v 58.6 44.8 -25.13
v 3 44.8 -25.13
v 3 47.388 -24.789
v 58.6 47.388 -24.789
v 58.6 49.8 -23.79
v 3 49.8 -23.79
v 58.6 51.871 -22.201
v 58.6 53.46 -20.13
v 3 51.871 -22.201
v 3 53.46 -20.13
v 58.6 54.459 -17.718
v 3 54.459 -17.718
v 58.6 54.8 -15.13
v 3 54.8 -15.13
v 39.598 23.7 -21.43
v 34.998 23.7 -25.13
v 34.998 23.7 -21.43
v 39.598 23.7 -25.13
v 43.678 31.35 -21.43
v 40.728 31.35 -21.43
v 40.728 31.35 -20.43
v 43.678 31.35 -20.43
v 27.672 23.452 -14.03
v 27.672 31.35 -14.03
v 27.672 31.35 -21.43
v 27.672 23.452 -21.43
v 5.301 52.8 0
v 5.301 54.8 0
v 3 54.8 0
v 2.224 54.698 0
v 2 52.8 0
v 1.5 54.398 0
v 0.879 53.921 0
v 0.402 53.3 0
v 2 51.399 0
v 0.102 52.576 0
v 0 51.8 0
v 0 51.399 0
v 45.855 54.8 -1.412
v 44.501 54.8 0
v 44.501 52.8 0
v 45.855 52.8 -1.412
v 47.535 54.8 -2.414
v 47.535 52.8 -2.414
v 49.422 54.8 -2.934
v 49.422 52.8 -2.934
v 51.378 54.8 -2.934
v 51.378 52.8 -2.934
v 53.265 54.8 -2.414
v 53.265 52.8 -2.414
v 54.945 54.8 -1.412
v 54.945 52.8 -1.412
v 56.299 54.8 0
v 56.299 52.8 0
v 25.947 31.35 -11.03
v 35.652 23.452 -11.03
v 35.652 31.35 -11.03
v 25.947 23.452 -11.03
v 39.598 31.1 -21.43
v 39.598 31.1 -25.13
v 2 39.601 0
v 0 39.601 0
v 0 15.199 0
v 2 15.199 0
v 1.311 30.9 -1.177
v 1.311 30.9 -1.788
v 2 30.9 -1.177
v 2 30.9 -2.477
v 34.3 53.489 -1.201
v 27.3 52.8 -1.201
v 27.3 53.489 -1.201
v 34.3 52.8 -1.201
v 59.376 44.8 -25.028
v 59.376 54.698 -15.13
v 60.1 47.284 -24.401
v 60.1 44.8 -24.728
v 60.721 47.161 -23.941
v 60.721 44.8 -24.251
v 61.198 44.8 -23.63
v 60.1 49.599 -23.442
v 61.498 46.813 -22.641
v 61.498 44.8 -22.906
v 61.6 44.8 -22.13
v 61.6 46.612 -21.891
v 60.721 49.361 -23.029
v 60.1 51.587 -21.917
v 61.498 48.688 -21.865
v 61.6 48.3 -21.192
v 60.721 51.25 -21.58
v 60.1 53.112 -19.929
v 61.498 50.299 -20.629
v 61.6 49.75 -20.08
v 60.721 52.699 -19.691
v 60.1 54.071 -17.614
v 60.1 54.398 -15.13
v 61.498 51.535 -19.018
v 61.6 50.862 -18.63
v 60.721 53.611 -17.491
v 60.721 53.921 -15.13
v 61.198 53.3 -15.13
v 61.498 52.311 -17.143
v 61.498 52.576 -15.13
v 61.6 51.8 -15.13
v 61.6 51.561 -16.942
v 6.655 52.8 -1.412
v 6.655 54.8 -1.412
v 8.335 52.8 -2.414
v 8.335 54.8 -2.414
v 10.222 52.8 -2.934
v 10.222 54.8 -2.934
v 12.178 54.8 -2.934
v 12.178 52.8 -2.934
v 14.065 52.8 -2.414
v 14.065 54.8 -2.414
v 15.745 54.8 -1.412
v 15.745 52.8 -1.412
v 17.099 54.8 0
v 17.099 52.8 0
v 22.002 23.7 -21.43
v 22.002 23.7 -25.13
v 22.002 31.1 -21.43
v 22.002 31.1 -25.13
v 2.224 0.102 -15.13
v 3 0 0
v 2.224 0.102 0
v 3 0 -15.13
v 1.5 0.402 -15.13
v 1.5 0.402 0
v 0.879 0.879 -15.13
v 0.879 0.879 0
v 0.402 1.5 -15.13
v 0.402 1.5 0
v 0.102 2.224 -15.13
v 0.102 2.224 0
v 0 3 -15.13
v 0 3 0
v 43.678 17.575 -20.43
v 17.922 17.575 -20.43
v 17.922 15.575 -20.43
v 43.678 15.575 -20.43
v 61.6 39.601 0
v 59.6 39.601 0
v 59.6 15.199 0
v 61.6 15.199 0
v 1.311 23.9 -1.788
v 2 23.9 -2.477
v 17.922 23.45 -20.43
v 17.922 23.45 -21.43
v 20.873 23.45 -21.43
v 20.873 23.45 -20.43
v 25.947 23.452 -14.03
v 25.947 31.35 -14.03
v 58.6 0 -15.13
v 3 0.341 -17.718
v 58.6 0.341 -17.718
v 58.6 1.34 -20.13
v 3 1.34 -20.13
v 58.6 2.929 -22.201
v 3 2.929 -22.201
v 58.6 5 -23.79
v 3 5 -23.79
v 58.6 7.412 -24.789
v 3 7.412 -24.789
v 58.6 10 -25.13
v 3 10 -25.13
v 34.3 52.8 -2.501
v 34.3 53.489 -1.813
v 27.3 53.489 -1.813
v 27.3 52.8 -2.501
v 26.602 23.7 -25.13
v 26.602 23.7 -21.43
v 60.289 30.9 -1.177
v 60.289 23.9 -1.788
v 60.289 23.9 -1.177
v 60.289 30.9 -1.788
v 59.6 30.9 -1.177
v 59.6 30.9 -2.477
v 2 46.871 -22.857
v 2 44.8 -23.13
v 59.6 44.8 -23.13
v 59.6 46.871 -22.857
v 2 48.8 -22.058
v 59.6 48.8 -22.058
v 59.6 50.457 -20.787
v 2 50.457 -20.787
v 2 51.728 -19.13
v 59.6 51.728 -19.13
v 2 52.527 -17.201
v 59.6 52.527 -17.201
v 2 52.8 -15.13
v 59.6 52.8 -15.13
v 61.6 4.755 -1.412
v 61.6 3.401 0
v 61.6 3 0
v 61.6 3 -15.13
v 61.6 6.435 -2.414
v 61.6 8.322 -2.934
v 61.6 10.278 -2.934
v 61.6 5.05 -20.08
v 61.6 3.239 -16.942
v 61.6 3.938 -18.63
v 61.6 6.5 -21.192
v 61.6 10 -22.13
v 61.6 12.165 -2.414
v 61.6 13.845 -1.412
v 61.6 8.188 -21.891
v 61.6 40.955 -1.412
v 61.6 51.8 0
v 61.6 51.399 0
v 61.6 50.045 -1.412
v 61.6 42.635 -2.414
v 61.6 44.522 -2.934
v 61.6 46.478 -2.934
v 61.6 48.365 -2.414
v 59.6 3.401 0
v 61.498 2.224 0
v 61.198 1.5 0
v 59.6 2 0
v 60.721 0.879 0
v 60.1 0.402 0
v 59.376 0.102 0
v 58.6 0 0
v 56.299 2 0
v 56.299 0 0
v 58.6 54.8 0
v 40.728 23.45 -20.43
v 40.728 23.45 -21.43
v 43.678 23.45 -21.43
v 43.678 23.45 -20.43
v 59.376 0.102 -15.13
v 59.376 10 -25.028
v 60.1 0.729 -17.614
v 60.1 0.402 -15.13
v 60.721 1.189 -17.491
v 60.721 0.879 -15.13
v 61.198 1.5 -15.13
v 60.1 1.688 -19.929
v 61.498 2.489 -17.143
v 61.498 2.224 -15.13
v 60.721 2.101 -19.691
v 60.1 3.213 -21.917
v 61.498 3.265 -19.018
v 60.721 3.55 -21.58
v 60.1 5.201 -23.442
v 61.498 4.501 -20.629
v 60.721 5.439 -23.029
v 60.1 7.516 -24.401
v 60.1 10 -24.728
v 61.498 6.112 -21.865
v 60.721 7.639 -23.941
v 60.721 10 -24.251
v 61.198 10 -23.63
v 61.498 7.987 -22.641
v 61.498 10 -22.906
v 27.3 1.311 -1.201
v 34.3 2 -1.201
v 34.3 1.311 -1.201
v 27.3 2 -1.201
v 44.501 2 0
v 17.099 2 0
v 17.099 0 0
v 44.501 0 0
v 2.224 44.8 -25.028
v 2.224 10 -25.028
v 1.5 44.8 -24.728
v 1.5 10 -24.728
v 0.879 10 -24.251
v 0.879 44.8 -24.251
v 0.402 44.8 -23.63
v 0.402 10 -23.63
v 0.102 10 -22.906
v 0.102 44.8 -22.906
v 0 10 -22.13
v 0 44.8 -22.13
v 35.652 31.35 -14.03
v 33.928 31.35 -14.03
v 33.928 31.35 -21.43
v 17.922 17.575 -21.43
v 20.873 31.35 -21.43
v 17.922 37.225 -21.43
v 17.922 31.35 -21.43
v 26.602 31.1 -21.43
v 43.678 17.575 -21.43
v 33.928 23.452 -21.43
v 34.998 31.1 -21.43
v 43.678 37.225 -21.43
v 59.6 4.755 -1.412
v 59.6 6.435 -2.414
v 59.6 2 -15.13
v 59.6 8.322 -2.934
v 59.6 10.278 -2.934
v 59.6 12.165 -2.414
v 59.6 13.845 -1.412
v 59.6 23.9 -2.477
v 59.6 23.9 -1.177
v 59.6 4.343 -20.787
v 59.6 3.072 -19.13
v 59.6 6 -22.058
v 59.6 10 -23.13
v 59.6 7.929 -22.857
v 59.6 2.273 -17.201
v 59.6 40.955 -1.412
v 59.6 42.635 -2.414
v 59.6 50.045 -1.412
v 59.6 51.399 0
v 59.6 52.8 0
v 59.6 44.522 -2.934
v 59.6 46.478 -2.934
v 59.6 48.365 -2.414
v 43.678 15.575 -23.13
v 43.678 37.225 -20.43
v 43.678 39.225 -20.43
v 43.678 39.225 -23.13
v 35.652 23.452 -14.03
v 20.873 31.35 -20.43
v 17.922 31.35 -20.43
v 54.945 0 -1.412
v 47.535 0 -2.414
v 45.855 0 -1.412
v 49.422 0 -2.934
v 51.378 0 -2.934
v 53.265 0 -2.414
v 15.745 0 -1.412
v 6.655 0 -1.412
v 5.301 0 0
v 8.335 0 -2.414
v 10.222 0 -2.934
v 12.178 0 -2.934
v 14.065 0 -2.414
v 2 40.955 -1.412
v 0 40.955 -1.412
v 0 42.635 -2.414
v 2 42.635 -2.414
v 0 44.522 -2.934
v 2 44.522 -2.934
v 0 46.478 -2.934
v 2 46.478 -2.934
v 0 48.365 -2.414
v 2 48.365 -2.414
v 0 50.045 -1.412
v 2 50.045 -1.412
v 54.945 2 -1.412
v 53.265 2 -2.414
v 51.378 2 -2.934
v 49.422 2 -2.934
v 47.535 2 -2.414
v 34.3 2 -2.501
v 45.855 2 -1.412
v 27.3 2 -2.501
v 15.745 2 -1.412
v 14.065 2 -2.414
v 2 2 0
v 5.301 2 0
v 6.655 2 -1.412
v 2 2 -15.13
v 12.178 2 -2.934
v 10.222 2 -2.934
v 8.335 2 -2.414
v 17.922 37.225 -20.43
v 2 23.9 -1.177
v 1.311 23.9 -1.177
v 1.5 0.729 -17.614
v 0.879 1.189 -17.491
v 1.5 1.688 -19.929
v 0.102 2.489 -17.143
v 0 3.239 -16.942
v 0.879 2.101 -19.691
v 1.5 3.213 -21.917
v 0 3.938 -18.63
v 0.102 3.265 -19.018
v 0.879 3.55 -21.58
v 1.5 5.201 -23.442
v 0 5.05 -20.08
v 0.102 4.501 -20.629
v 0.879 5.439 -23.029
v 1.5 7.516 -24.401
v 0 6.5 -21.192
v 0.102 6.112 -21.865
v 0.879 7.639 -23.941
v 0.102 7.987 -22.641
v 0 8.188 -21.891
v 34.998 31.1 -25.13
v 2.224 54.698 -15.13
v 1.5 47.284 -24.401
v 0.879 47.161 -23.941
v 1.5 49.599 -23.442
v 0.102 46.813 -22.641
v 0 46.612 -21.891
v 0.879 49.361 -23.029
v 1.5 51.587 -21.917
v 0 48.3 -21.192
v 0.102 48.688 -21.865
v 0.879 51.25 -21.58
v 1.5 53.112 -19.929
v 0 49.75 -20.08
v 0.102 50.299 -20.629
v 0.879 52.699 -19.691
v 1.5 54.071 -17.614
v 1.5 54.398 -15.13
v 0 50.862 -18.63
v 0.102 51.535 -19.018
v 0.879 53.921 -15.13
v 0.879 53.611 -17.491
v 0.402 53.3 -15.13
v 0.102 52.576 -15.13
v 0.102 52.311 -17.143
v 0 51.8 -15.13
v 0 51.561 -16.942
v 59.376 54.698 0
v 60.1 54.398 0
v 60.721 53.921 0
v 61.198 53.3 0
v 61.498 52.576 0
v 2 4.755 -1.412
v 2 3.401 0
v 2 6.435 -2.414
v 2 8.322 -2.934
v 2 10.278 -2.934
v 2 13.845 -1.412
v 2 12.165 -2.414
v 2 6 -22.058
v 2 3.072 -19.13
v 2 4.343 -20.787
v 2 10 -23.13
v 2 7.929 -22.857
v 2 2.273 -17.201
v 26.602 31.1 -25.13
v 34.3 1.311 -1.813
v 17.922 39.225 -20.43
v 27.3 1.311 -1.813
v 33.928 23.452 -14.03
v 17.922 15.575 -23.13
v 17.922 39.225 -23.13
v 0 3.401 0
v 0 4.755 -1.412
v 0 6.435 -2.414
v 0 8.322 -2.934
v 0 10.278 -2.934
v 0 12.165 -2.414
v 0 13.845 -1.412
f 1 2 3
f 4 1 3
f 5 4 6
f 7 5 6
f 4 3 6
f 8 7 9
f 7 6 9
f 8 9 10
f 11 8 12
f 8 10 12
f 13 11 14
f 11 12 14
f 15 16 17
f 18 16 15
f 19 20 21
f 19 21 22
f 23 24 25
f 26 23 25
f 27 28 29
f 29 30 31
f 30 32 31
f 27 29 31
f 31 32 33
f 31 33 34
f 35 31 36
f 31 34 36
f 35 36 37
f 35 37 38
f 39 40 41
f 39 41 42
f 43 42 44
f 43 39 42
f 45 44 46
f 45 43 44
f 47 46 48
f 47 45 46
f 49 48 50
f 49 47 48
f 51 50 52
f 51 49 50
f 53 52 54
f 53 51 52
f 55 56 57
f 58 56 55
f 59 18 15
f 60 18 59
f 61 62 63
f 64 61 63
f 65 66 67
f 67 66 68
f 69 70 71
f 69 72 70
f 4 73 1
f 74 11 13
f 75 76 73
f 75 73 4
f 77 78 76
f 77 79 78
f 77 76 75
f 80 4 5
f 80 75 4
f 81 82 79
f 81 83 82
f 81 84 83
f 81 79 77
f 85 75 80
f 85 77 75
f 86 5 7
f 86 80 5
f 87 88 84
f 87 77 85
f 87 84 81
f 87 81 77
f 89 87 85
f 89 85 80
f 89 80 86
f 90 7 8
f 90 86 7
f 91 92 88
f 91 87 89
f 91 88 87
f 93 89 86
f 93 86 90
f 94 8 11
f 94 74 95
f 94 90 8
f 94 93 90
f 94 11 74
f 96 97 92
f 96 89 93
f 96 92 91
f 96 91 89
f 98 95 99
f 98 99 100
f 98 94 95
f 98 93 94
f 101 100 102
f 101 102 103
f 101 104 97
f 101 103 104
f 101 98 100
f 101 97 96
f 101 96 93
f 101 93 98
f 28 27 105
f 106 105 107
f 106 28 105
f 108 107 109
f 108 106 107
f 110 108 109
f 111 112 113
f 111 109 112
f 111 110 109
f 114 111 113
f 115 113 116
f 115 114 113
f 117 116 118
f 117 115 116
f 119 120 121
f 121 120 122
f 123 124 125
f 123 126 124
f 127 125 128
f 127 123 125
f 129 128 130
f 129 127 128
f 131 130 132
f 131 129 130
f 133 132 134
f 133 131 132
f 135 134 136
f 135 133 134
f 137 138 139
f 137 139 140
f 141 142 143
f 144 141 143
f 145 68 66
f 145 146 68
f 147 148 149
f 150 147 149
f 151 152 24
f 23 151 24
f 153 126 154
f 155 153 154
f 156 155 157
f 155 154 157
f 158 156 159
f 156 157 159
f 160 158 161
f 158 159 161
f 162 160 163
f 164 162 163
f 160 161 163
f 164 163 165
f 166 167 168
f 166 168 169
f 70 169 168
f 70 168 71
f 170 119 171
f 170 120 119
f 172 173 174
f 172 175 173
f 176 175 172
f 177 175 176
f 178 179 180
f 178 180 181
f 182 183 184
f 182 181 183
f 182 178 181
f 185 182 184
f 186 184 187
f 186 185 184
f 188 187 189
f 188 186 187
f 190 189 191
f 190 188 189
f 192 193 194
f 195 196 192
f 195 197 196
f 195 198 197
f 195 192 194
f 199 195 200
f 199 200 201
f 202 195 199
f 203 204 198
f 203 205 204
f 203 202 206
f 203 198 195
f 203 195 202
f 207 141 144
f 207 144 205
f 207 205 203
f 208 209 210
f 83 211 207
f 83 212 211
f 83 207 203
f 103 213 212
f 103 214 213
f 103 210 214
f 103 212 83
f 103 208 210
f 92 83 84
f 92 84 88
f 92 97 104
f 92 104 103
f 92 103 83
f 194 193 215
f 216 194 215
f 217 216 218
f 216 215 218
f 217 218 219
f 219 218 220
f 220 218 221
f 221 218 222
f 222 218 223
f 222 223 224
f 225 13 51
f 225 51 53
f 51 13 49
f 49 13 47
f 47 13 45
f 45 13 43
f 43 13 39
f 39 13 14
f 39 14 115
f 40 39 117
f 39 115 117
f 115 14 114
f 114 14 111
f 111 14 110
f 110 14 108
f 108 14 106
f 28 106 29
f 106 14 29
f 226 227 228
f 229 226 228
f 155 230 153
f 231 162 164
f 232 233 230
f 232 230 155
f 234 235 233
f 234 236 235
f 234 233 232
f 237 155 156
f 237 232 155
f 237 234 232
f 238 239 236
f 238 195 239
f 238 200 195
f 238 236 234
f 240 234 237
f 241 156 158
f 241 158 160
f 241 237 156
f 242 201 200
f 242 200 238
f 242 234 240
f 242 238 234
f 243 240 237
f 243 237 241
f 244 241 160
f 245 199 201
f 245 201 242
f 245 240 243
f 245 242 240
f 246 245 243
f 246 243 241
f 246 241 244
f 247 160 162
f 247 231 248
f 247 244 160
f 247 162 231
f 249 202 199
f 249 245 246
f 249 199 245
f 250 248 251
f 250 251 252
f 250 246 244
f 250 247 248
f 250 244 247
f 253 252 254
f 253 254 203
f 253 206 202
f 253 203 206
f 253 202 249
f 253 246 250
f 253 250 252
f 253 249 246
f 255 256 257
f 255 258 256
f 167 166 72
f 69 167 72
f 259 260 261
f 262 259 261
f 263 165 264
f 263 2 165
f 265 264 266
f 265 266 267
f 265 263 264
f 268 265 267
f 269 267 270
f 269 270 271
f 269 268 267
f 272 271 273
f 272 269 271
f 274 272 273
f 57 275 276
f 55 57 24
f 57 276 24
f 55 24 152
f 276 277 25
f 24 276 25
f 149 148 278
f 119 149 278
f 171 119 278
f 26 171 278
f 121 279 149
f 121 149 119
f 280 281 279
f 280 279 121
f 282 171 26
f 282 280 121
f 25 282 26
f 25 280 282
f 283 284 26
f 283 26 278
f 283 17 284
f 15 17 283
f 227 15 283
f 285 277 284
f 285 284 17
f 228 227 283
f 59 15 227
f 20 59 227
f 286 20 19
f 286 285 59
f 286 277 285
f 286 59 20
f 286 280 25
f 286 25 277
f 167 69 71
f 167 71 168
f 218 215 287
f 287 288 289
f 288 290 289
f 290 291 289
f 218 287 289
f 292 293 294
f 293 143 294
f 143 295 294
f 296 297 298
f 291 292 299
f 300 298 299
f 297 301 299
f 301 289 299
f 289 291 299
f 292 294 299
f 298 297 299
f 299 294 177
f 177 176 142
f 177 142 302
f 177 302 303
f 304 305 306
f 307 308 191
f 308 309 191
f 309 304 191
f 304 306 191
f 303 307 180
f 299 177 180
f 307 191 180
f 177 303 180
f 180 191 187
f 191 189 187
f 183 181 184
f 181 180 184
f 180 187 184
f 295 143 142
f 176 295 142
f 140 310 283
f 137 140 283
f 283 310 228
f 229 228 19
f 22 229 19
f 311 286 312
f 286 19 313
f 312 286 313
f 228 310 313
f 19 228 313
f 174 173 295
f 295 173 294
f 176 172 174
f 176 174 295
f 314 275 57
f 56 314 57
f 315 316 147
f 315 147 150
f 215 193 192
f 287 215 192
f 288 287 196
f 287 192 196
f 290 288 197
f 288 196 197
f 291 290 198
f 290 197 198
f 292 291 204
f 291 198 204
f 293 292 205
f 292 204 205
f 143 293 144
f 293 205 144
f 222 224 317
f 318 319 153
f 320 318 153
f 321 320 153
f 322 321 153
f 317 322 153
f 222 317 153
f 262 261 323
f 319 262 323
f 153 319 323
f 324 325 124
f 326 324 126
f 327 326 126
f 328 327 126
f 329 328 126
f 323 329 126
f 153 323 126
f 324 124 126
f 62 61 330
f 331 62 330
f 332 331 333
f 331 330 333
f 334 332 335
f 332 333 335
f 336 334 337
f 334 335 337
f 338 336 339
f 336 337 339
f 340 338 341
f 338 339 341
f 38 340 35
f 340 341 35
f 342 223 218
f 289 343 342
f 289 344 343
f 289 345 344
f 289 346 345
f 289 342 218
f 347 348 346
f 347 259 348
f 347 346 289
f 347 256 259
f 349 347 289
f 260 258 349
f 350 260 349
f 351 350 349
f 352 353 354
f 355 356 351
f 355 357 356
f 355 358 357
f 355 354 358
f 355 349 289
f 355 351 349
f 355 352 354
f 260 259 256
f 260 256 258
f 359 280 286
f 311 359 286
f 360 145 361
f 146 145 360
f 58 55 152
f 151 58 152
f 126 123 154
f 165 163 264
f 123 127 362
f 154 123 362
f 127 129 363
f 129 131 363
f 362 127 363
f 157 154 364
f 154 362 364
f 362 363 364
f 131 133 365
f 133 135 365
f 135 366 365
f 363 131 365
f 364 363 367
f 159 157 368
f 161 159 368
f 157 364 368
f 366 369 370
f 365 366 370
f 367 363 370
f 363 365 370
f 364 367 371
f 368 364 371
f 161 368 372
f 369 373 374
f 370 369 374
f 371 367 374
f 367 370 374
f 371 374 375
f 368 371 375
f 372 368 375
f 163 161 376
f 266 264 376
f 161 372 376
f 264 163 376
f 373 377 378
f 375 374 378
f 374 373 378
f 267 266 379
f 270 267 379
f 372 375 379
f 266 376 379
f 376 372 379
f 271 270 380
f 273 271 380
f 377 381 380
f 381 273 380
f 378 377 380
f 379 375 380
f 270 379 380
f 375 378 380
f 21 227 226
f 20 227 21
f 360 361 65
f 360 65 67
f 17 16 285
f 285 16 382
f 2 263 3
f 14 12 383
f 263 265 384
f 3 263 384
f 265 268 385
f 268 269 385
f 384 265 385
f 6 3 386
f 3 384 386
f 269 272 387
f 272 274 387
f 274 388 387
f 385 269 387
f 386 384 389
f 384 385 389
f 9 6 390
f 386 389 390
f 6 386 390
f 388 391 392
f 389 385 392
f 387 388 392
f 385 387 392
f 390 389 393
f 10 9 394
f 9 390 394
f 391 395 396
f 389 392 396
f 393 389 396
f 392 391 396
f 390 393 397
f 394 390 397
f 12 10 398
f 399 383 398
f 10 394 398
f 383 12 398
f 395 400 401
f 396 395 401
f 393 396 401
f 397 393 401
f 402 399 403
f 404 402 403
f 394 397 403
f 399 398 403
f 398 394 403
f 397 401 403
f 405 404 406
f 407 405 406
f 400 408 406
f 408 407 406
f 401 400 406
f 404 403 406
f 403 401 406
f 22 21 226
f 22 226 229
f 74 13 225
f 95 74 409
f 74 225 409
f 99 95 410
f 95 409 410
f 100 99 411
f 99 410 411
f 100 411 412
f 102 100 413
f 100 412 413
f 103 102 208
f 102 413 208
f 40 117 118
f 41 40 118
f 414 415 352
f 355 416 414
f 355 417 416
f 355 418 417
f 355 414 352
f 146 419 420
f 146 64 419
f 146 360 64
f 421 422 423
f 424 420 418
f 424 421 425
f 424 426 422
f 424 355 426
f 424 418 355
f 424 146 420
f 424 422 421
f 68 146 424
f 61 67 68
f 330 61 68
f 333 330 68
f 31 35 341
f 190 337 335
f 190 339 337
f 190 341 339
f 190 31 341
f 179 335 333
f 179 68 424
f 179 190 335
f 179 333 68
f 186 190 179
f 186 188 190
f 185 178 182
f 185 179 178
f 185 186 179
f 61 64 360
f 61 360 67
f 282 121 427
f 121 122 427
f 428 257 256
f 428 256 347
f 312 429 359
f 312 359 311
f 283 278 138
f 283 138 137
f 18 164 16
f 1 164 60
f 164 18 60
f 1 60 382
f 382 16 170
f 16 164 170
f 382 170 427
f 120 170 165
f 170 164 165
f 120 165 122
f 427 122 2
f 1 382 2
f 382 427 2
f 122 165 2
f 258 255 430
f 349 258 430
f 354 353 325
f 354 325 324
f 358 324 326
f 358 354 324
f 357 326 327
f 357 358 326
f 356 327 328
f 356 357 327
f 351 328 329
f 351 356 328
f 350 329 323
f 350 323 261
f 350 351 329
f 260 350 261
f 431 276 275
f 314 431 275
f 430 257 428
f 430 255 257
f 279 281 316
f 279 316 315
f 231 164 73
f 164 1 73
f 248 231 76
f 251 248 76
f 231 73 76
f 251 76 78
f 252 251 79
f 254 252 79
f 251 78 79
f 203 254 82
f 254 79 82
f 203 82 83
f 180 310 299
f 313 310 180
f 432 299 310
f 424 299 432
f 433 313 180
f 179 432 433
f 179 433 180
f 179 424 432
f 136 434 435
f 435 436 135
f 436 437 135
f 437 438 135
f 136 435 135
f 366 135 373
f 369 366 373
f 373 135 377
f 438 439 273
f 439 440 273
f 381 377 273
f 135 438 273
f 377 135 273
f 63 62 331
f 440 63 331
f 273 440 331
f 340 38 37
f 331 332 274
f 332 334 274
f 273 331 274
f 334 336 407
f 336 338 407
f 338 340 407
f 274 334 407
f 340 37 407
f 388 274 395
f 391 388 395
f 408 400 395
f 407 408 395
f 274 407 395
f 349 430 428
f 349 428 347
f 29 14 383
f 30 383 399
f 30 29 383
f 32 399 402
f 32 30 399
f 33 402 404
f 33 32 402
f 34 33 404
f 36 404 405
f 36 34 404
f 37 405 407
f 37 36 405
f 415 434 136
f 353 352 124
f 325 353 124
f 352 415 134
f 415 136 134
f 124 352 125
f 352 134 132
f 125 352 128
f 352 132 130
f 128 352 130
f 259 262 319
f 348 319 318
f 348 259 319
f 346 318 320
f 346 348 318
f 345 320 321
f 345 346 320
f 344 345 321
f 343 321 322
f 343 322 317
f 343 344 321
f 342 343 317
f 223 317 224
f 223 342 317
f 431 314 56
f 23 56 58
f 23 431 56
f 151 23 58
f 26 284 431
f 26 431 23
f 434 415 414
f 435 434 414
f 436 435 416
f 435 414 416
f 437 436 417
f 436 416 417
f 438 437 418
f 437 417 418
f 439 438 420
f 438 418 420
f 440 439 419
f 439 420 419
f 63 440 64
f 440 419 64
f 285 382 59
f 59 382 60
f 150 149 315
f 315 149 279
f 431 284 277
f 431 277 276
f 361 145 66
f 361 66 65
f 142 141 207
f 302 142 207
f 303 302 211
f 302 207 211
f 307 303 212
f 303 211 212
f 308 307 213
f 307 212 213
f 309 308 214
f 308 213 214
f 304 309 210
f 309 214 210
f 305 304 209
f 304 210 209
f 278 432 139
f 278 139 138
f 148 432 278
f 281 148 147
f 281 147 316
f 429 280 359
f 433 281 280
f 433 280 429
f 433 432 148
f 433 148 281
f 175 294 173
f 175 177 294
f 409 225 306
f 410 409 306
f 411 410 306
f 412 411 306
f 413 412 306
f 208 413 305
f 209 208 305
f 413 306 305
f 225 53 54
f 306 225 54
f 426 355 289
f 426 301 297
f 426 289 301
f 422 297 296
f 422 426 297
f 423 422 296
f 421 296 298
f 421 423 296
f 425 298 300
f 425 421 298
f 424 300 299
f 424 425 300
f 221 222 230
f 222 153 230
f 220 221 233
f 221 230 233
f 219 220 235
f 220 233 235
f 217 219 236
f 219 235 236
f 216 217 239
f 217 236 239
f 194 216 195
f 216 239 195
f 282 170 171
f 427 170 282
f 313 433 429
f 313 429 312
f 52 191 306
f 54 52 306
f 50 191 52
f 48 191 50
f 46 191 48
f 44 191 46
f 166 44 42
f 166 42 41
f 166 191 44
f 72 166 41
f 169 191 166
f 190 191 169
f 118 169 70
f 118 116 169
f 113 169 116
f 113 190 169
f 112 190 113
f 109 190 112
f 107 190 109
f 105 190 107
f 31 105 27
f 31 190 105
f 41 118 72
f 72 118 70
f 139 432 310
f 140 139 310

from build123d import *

# Parameters (mm, degrees)
EXTRUDE_1_DEPTH     = 61.6
SHELL_1_T           = -2
FILLET_2_R          = 3
CUT_EXTRUDE_1_REACH = 88.192
SKETCH_3_W          = 4.6
SKETCH_3_H          = 7.4
SKETCH_4_W          = 4.6
SKETCH_4_H          = 7.4
EXTRUDE_2_DEPTH     = 1.7
SKETCH_5_W          = 2.95
SKETCH_5_H          = 7.9
SKETCH_5_W_2        = 25.755
SKETCH_5_H_2        = 2
EXTRUDE_3_DEPTH     = 1
EXTRUDE_4_DEPTH     = 7.897587
CUT_EXTRUDE_START   = -61.6
CUT_EXTRUDE_3_DEPTH = 61.6
CUT_EXTRUDE_START_2 = -54.8
CUT_EXTRUDE_4_DEPTH = 54.8
CUT_EXTRUDE_5_DEPTH = 3.5
CUT_EXTRUDE_6_DEPTH = 3.5


with BuildPart() as part:
    # ｽｹｯﾁ2 → ﾎﾞｽ - 押し出し1 (new body)
    with BuildSketch(Plane(origin=(0, 0, 0), x_dir=(0, 0, -1), z_dir=(1, 0, 0))):
        with BuildLine():
            Line((0, 0), (15.13, 0))
            ThreePointArc((15.13, 0), (22.201067812, 2.928932188), (25.13, 10))
            Line((25.13, 10), (25.13, 44.8))
            ThreePointArc((25.13, 44.8), (22.201067812, 51.871067812), (15.13, 54.8))
            Line((15.13, 54.8), (0, 54.8))
            Line((0, 54.8), (0, 0))
        make_face()
    extrude(amount=EXTRUDE_1_DEPTH)

    # ｼｪﾙ1
    shell_1_openings = [part.faces().sort_by_distance(p)[0] for p in [
        (30.8, 27.4, 0),
    ]]
    offset(amount=SHELL_1_T, openings=shell_1_openings, kind=Kind.INTERSECTION)

    # ﾌｨﾚｯﾄ2
    fillet_2_edges = [part.edges().sort_by_distance(p)[0] for p in [
        (61.6, 2.928932188, -22.201067812),
        (61.6, 27.4, -25.13),
        (61.6, 51.871067812, -22.201067812),
        (61.6, 54.8, -7.565),
        (0, 54.8, -7.565),
        (0, 51.871067812, -22.201067812),
        (0, 27.4, -25.13),
        (61.6, 0, -7.565),
        (0, 2.928932188, -22.201067812),
        (0, 0, -7.565),
    ]]
    fillet(fillet_2_edges, radius=FILLET_2_R)

    # ｽｹｯﾁ3 → ｶｯﾄ - 押し出し1 (cut, up to next)
    with BuildSketch(Plane(origin=(0, 0, -25.13), x_dir=(-1, 0, 0), z_dir=(0, 0, -1)), mode=Mode.PRIVATE) as cut_extrude_1_sk1:
        with Locations((-37.2975, 27.4)):
            Rectangle(SKETCH_3_W, SKETCH_3_H)
    cut_extrude_1_tool1 = extrude(cut_extrude_1_sk1.sketch, amount=-CUT_EXTRUDE_1_REACH, mode=Mode.PRIVATE) & part.part
    # ｽｹｯﾁ3 → ｶｯﾄ - 押し出し1 (cut, up to next)
    with BuildSketch(Plane(origin=(0, 0, -25.13), x_dir=(-1, 0, 0), z_dir=(0, 0, -1)), mode=Mode.PRIVATE) as cut_extrude_1_sk2:
        with Locations((-24.3025, 27.4)):
            Rectangle(SKETCH_3_W, SKETCH_3_H)
    cut_extrude_1_tool2 = extrude(cut_extrude_1_sk2.sketch, amount=-CUT_EXTRUDE_1_REACH, mode=Mode.PRIVATE) & part.part
    add(cut_extrude_1_tool1.solids().sort_by_distance((37.2975, 27.4, -25.13))[0], mode=Mode.SUBTRACT)
    add(cut_extrude_1_tool2.solids().sort_by_distance((24.3025, 27.4, -25.13))[0], mode=Mode.SUBTRACT)

    # ｽｹｯﾁ4 → ﾎﾞｽ - 押し出し2 (add)
    with BuildSketch(Plane.XY.offset(-23.13)):
        Polygon((17.9225, 15.575), (30.6725, 15.575), (43.6775, 15.575), (43.6775, 39.225), (30.6725, 39.225), (17.9225, 39.225), align=None)
        with Locations((24.3025, 27.4)):
            Rectangle(SKETCH_4_W, SKETCH_4_H, mode=Mode.SUBTRACT)
        with Locations((37.2975, 27.4)):
            Rectangle(SKETCH_4_W, SKETCH_4_H, mode=Mode.SUBTRACT)
    extrude(amount=EXTRUDE_2_DEPTH)

    # ｽｹｯﾁ5 → ﾎﾞｽ - 押し出し3 (add)
    with BuildSketch(Plane.XY.offset(-21.43)):
        with Locations((19.3975, 27.4)):
            Rectangle(SKETCH_5_W, SKETCH_5_H)
        with Locations((42.2025, 27.4)):
            Rectangle(SKETCH_5_W, SKETCH_5_H)
        with Locations((30.8, 38.225)):
            Rectangle(SKETCH_5_W_2, SKETCH_5_H_2)
        with Locations((30.8, 16.575)):
            Rectangle(SKETCH_5_W_2, SKETCH_5_H_2)
    extrude(amount=EXTRUDE_3_DEPTH)

    # ｽｹｯﾁ6 → ﾎﾞｽ - 押し出し4 (add)
    with BuildSketch(Plane(origin=(-6.518280687, 23.45241299, -44.223812227), x_dir=(1, 0, 0), z_dir=(0, 1, 0))):
        Polygon((34.190780687, -22.793812227), (40.445780687, -22.793812227), (40.445780687, -30.193812227), (42.170780687, -30.193812227), (42.170780687, -33.193812227), (32.465780687, -33.193812227), (32.465780687, -30.193812227), (34.190780687, -30.193812227), align=None)
    extrude(amount=EXTRUDE_4_DEPTH)

    # ｽｹｯﾁ8 → ｶｯﾄ - 押し出し3 (cut)
    with BuildSketch(Plane.ZY.offset(CUT_EXTRUDE_START)):
        with BuildLine():
            Line((0, 51.399152482), (0, 39.600847518))
            ThreePointArc((0, 39.600847518), (-3, 45.5), (0, 51.399152482))
        make_face()
        with BuildLine():
            Line((0, 15.199152482), (0, 3.400847518))
            ThreePointArc((0, 3.400847518), (-3, 9.3), (0, 15.199152482))
        make_face()
    extrude(amount=CUT_EXTRUDE_3_DEPTH, mode=Mode.SUBTRACT)

    # ｽｹｯﾁ9 → ｶｯﾄ - 押し出し4 (cut)
    with BuildSketch(Plane.XZ.offset(CUT_EXTRUDE_START_2)):
        with BuildLine():
            Line((56.299152482, 0), (44.500847518, 0))
            ThreePointArc((44.500847518, 0), (50.4, -3), (56.299152482, 0))
        make_face()
        with BuildLine():
            Line((17.099152482, 0), (5.300847518, 0))
            ThreePointArc((5.300847518, 0), (11.2, -3), (17.099152482, 0))
        make_face()
    extrude(amount=CUT_EXTRUDE_4_DEPTH, mode=Mode.SUBTRACT)

    # ｽｹｯﾁ11 → ｶｯﾄ - 押し出し5 (cut, symmetric)
    with BuildSketch(Plane(origin=(0, 27.4, 0), x_dir=(-1, 0, 0), z_dir=(0, -1, 0))):
        Polygon((-59.6, 1.176601917), (-59.6, 2.476687437), (-60.288664164, 1.788023273), (-60.288664164, 1.176601917), align=None)
        Polygon((-1.311335836, 1.176601917), (-2, 1.176601917), (-2, 2.476687437), (-1.311335836, 1.788023273), align=None)
    extrude(amount=CUT_EXTRUDE_5_DEPTH, both=True, mode=Mode.SUBTRACT)

    # ｽｹｯﾁ12 → ｶｯﾄ - 押し出し6 (cut, symmetric)
    with BuildSketch(Plane(origin=(30.8, 0, 0), x_dir=(0, 0, -1), z_dir=(1, 0, 0))):
        Polygon((2.501421356, 2), (1.201335836, 2), (1.201335836, 1.311335836), (1.812757192, 1.311335836), align=None)
        Polygon((1.812757192, 53.488664164), (2.501421356, 52.8), (1.201335836, 52.8), (1.201335836, 53.488664164), align=None)
    extrude(amount=CUT_EXTRUDE_6_DEPTH, both=True, mode=Mode.SUBTRACT)


solid = part.part
